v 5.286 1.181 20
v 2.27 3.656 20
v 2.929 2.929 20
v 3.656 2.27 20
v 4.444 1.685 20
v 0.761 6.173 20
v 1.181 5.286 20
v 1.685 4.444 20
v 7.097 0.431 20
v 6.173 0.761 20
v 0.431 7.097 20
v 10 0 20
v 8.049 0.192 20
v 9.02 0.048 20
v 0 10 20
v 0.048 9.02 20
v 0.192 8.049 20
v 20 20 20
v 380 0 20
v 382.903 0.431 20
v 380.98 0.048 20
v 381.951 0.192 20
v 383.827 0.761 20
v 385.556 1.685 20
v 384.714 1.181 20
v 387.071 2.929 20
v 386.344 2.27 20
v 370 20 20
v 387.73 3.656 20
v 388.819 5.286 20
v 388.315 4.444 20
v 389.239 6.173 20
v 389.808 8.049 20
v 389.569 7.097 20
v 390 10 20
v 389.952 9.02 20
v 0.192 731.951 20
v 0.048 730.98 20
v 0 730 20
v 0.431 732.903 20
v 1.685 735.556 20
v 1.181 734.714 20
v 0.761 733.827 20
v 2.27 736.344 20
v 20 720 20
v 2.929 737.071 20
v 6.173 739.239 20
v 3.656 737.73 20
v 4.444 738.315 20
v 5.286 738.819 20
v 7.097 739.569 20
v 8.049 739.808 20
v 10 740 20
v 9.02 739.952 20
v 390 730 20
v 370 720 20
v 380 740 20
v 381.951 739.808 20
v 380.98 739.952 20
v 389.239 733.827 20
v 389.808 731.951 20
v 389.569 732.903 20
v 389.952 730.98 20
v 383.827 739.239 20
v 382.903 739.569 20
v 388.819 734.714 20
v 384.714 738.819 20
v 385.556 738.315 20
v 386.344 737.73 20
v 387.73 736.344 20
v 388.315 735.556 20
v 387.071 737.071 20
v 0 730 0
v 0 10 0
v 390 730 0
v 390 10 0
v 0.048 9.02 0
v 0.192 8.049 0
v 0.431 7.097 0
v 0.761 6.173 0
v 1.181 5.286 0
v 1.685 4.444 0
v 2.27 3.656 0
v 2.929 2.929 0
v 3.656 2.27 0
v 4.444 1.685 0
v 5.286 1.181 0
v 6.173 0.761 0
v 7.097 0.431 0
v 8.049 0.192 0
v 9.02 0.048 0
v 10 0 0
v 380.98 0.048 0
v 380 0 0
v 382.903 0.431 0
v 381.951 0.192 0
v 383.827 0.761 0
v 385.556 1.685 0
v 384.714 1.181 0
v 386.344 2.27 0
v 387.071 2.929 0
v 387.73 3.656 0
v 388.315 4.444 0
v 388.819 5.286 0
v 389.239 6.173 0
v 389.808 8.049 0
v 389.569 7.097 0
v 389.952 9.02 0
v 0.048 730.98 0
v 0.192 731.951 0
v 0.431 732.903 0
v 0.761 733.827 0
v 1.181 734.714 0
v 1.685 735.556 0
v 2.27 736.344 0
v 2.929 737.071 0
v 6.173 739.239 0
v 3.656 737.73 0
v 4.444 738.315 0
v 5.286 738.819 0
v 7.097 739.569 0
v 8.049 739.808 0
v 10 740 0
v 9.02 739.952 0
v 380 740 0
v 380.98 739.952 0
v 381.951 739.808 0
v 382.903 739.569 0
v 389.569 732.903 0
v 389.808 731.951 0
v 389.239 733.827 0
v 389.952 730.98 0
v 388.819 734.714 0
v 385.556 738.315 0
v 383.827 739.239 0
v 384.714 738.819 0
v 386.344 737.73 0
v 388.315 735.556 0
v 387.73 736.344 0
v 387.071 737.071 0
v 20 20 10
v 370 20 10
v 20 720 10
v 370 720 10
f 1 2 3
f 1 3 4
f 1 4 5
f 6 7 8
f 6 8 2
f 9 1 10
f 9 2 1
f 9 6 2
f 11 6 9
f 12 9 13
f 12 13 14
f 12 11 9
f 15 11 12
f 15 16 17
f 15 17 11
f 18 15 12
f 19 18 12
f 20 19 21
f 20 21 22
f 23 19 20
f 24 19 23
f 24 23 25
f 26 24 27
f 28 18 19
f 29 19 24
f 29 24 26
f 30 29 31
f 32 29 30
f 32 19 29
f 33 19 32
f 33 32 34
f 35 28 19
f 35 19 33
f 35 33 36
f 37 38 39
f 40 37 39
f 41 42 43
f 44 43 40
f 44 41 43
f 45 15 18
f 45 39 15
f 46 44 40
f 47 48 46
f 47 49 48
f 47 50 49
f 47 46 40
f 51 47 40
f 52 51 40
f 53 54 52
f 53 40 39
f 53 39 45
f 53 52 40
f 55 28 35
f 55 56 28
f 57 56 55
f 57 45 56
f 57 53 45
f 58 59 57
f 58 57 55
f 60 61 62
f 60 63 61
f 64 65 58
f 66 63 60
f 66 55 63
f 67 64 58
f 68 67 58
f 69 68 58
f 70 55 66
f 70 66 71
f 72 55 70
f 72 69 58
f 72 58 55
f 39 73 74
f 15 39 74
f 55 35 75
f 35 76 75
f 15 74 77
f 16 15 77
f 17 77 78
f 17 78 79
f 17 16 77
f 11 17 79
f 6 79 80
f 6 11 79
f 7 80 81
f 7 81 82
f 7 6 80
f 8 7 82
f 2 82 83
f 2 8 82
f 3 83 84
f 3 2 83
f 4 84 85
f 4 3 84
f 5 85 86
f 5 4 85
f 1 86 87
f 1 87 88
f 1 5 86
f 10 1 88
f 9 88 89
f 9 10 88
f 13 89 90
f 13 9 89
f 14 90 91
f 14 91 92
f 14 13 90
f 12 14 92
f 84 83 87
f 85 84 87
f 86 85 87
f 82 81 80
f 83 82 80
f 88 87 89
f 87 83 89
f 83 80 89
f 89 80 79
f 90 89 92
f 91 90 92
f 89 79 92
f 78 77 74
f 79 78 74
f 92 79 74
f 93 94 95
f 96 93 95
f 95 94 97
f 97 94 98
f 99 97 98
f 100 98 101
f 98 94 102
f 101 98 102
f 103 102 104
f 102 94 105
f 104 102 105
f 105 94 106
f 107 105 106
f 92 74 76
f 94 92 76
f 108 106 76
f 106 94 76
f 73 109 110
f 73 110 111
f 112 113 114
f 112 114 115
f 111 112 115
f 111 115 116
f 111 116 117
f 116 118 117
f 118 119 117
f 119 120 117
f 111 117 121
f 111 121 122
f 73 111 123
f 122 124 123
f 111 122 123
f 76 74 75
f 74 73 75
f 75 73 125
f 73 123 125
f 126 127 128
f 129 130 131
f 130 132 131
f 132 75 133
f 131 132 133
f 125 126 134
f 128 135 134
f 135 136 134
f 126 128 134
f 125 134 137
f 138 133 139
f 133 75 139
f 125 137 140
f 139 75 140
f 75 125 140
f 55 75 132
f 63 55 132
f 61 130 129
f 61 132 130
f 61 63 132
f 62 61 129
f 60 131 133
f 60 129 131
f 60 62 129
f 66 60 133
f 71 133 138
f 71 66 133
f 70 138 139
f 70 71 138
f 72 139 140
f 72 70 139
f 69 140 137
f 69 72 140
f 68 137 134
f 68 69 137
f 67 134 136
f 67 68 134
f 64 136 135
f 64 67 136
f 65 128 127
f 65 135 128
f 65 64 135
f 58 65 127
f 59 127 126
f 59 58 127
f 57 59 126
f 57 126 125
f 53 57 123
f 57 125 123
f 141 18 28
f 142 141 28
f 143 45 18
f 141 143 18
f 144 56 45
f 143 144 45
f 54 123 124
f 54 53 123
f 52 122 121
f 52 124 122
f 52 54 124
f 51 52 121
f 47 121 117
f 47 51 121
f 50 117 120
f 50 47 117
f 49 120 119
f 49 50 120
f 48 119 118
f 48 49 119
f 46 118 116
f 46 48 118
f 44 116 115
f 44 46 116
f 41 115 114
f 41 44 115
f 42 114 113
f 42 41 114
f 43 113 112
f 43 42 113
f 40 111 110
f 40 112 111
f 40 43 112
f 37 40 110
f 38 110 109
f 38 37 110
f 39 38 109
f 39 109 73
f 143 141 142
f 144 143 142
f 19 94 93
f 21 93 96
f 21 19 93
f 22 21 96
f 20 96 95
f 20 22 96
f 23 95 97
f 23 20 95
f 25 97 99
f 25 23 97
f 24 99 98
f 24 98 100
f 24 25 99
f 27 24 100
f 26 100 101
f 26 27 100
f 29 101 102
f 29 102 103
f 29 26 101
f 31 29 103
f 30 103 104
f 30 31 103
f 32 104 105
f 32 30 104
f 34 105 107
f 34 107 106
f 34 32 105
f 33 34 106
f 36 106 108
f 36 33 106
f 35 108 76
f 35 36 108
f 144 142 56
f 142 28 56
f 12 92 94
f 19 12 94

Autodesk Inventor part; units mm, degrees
ref_plane "YZ Plane" through (0, 0, 0) normal (1, 0, 0) x (0, 1, 0)
ref_plane "XZ Plane" through (0, 0, 0) normal (0, 1, 0) x (-1, 0, 0)
ref_plane "XY Plane" through (0, 0, 0) normal (0, 0, 1) x (1, 0, 0)
sketch "Sketch1" plane through (0, 0, 0) normal (0, 0, 1) x (1, 0, 0)
  line L0 (0, 0) -> (390, 0)
  line L1 (390, 0) -> (390, 740)
  line L2 (390, 740) -> (0, 740)
  line L3 (0, 740) -> (0, 0)
  dimension "d0" = 390
  dimension "d1" = 740
extrude "Extrusion1" add sketch "Sketch1" along normal blind 20
sketch "Sketch2" plane through (0, 0, 20) normal (0, 0, 1) x (1, 0, 0)
  line L0 (20, 20) -> (370, 20)
  line L1 (370, 20) -> (370, 720)
  line L2 (370, 720) -> (20, 720)
  line L3 (20, 720) -> (20, 20)
  point P0 (0, 0)
  dimension "d6" = 350
  dimension "d7" = 700
extrude "Extrusion2" cut sketch "Sketch2" against normal blind 10
fillet "Fillet1" radius 10 4 edges at (390, 740, 10) (390, 0, 10) (0, 740, 10) (0, 0, 10)
properties part number "Tavla 35x70"
